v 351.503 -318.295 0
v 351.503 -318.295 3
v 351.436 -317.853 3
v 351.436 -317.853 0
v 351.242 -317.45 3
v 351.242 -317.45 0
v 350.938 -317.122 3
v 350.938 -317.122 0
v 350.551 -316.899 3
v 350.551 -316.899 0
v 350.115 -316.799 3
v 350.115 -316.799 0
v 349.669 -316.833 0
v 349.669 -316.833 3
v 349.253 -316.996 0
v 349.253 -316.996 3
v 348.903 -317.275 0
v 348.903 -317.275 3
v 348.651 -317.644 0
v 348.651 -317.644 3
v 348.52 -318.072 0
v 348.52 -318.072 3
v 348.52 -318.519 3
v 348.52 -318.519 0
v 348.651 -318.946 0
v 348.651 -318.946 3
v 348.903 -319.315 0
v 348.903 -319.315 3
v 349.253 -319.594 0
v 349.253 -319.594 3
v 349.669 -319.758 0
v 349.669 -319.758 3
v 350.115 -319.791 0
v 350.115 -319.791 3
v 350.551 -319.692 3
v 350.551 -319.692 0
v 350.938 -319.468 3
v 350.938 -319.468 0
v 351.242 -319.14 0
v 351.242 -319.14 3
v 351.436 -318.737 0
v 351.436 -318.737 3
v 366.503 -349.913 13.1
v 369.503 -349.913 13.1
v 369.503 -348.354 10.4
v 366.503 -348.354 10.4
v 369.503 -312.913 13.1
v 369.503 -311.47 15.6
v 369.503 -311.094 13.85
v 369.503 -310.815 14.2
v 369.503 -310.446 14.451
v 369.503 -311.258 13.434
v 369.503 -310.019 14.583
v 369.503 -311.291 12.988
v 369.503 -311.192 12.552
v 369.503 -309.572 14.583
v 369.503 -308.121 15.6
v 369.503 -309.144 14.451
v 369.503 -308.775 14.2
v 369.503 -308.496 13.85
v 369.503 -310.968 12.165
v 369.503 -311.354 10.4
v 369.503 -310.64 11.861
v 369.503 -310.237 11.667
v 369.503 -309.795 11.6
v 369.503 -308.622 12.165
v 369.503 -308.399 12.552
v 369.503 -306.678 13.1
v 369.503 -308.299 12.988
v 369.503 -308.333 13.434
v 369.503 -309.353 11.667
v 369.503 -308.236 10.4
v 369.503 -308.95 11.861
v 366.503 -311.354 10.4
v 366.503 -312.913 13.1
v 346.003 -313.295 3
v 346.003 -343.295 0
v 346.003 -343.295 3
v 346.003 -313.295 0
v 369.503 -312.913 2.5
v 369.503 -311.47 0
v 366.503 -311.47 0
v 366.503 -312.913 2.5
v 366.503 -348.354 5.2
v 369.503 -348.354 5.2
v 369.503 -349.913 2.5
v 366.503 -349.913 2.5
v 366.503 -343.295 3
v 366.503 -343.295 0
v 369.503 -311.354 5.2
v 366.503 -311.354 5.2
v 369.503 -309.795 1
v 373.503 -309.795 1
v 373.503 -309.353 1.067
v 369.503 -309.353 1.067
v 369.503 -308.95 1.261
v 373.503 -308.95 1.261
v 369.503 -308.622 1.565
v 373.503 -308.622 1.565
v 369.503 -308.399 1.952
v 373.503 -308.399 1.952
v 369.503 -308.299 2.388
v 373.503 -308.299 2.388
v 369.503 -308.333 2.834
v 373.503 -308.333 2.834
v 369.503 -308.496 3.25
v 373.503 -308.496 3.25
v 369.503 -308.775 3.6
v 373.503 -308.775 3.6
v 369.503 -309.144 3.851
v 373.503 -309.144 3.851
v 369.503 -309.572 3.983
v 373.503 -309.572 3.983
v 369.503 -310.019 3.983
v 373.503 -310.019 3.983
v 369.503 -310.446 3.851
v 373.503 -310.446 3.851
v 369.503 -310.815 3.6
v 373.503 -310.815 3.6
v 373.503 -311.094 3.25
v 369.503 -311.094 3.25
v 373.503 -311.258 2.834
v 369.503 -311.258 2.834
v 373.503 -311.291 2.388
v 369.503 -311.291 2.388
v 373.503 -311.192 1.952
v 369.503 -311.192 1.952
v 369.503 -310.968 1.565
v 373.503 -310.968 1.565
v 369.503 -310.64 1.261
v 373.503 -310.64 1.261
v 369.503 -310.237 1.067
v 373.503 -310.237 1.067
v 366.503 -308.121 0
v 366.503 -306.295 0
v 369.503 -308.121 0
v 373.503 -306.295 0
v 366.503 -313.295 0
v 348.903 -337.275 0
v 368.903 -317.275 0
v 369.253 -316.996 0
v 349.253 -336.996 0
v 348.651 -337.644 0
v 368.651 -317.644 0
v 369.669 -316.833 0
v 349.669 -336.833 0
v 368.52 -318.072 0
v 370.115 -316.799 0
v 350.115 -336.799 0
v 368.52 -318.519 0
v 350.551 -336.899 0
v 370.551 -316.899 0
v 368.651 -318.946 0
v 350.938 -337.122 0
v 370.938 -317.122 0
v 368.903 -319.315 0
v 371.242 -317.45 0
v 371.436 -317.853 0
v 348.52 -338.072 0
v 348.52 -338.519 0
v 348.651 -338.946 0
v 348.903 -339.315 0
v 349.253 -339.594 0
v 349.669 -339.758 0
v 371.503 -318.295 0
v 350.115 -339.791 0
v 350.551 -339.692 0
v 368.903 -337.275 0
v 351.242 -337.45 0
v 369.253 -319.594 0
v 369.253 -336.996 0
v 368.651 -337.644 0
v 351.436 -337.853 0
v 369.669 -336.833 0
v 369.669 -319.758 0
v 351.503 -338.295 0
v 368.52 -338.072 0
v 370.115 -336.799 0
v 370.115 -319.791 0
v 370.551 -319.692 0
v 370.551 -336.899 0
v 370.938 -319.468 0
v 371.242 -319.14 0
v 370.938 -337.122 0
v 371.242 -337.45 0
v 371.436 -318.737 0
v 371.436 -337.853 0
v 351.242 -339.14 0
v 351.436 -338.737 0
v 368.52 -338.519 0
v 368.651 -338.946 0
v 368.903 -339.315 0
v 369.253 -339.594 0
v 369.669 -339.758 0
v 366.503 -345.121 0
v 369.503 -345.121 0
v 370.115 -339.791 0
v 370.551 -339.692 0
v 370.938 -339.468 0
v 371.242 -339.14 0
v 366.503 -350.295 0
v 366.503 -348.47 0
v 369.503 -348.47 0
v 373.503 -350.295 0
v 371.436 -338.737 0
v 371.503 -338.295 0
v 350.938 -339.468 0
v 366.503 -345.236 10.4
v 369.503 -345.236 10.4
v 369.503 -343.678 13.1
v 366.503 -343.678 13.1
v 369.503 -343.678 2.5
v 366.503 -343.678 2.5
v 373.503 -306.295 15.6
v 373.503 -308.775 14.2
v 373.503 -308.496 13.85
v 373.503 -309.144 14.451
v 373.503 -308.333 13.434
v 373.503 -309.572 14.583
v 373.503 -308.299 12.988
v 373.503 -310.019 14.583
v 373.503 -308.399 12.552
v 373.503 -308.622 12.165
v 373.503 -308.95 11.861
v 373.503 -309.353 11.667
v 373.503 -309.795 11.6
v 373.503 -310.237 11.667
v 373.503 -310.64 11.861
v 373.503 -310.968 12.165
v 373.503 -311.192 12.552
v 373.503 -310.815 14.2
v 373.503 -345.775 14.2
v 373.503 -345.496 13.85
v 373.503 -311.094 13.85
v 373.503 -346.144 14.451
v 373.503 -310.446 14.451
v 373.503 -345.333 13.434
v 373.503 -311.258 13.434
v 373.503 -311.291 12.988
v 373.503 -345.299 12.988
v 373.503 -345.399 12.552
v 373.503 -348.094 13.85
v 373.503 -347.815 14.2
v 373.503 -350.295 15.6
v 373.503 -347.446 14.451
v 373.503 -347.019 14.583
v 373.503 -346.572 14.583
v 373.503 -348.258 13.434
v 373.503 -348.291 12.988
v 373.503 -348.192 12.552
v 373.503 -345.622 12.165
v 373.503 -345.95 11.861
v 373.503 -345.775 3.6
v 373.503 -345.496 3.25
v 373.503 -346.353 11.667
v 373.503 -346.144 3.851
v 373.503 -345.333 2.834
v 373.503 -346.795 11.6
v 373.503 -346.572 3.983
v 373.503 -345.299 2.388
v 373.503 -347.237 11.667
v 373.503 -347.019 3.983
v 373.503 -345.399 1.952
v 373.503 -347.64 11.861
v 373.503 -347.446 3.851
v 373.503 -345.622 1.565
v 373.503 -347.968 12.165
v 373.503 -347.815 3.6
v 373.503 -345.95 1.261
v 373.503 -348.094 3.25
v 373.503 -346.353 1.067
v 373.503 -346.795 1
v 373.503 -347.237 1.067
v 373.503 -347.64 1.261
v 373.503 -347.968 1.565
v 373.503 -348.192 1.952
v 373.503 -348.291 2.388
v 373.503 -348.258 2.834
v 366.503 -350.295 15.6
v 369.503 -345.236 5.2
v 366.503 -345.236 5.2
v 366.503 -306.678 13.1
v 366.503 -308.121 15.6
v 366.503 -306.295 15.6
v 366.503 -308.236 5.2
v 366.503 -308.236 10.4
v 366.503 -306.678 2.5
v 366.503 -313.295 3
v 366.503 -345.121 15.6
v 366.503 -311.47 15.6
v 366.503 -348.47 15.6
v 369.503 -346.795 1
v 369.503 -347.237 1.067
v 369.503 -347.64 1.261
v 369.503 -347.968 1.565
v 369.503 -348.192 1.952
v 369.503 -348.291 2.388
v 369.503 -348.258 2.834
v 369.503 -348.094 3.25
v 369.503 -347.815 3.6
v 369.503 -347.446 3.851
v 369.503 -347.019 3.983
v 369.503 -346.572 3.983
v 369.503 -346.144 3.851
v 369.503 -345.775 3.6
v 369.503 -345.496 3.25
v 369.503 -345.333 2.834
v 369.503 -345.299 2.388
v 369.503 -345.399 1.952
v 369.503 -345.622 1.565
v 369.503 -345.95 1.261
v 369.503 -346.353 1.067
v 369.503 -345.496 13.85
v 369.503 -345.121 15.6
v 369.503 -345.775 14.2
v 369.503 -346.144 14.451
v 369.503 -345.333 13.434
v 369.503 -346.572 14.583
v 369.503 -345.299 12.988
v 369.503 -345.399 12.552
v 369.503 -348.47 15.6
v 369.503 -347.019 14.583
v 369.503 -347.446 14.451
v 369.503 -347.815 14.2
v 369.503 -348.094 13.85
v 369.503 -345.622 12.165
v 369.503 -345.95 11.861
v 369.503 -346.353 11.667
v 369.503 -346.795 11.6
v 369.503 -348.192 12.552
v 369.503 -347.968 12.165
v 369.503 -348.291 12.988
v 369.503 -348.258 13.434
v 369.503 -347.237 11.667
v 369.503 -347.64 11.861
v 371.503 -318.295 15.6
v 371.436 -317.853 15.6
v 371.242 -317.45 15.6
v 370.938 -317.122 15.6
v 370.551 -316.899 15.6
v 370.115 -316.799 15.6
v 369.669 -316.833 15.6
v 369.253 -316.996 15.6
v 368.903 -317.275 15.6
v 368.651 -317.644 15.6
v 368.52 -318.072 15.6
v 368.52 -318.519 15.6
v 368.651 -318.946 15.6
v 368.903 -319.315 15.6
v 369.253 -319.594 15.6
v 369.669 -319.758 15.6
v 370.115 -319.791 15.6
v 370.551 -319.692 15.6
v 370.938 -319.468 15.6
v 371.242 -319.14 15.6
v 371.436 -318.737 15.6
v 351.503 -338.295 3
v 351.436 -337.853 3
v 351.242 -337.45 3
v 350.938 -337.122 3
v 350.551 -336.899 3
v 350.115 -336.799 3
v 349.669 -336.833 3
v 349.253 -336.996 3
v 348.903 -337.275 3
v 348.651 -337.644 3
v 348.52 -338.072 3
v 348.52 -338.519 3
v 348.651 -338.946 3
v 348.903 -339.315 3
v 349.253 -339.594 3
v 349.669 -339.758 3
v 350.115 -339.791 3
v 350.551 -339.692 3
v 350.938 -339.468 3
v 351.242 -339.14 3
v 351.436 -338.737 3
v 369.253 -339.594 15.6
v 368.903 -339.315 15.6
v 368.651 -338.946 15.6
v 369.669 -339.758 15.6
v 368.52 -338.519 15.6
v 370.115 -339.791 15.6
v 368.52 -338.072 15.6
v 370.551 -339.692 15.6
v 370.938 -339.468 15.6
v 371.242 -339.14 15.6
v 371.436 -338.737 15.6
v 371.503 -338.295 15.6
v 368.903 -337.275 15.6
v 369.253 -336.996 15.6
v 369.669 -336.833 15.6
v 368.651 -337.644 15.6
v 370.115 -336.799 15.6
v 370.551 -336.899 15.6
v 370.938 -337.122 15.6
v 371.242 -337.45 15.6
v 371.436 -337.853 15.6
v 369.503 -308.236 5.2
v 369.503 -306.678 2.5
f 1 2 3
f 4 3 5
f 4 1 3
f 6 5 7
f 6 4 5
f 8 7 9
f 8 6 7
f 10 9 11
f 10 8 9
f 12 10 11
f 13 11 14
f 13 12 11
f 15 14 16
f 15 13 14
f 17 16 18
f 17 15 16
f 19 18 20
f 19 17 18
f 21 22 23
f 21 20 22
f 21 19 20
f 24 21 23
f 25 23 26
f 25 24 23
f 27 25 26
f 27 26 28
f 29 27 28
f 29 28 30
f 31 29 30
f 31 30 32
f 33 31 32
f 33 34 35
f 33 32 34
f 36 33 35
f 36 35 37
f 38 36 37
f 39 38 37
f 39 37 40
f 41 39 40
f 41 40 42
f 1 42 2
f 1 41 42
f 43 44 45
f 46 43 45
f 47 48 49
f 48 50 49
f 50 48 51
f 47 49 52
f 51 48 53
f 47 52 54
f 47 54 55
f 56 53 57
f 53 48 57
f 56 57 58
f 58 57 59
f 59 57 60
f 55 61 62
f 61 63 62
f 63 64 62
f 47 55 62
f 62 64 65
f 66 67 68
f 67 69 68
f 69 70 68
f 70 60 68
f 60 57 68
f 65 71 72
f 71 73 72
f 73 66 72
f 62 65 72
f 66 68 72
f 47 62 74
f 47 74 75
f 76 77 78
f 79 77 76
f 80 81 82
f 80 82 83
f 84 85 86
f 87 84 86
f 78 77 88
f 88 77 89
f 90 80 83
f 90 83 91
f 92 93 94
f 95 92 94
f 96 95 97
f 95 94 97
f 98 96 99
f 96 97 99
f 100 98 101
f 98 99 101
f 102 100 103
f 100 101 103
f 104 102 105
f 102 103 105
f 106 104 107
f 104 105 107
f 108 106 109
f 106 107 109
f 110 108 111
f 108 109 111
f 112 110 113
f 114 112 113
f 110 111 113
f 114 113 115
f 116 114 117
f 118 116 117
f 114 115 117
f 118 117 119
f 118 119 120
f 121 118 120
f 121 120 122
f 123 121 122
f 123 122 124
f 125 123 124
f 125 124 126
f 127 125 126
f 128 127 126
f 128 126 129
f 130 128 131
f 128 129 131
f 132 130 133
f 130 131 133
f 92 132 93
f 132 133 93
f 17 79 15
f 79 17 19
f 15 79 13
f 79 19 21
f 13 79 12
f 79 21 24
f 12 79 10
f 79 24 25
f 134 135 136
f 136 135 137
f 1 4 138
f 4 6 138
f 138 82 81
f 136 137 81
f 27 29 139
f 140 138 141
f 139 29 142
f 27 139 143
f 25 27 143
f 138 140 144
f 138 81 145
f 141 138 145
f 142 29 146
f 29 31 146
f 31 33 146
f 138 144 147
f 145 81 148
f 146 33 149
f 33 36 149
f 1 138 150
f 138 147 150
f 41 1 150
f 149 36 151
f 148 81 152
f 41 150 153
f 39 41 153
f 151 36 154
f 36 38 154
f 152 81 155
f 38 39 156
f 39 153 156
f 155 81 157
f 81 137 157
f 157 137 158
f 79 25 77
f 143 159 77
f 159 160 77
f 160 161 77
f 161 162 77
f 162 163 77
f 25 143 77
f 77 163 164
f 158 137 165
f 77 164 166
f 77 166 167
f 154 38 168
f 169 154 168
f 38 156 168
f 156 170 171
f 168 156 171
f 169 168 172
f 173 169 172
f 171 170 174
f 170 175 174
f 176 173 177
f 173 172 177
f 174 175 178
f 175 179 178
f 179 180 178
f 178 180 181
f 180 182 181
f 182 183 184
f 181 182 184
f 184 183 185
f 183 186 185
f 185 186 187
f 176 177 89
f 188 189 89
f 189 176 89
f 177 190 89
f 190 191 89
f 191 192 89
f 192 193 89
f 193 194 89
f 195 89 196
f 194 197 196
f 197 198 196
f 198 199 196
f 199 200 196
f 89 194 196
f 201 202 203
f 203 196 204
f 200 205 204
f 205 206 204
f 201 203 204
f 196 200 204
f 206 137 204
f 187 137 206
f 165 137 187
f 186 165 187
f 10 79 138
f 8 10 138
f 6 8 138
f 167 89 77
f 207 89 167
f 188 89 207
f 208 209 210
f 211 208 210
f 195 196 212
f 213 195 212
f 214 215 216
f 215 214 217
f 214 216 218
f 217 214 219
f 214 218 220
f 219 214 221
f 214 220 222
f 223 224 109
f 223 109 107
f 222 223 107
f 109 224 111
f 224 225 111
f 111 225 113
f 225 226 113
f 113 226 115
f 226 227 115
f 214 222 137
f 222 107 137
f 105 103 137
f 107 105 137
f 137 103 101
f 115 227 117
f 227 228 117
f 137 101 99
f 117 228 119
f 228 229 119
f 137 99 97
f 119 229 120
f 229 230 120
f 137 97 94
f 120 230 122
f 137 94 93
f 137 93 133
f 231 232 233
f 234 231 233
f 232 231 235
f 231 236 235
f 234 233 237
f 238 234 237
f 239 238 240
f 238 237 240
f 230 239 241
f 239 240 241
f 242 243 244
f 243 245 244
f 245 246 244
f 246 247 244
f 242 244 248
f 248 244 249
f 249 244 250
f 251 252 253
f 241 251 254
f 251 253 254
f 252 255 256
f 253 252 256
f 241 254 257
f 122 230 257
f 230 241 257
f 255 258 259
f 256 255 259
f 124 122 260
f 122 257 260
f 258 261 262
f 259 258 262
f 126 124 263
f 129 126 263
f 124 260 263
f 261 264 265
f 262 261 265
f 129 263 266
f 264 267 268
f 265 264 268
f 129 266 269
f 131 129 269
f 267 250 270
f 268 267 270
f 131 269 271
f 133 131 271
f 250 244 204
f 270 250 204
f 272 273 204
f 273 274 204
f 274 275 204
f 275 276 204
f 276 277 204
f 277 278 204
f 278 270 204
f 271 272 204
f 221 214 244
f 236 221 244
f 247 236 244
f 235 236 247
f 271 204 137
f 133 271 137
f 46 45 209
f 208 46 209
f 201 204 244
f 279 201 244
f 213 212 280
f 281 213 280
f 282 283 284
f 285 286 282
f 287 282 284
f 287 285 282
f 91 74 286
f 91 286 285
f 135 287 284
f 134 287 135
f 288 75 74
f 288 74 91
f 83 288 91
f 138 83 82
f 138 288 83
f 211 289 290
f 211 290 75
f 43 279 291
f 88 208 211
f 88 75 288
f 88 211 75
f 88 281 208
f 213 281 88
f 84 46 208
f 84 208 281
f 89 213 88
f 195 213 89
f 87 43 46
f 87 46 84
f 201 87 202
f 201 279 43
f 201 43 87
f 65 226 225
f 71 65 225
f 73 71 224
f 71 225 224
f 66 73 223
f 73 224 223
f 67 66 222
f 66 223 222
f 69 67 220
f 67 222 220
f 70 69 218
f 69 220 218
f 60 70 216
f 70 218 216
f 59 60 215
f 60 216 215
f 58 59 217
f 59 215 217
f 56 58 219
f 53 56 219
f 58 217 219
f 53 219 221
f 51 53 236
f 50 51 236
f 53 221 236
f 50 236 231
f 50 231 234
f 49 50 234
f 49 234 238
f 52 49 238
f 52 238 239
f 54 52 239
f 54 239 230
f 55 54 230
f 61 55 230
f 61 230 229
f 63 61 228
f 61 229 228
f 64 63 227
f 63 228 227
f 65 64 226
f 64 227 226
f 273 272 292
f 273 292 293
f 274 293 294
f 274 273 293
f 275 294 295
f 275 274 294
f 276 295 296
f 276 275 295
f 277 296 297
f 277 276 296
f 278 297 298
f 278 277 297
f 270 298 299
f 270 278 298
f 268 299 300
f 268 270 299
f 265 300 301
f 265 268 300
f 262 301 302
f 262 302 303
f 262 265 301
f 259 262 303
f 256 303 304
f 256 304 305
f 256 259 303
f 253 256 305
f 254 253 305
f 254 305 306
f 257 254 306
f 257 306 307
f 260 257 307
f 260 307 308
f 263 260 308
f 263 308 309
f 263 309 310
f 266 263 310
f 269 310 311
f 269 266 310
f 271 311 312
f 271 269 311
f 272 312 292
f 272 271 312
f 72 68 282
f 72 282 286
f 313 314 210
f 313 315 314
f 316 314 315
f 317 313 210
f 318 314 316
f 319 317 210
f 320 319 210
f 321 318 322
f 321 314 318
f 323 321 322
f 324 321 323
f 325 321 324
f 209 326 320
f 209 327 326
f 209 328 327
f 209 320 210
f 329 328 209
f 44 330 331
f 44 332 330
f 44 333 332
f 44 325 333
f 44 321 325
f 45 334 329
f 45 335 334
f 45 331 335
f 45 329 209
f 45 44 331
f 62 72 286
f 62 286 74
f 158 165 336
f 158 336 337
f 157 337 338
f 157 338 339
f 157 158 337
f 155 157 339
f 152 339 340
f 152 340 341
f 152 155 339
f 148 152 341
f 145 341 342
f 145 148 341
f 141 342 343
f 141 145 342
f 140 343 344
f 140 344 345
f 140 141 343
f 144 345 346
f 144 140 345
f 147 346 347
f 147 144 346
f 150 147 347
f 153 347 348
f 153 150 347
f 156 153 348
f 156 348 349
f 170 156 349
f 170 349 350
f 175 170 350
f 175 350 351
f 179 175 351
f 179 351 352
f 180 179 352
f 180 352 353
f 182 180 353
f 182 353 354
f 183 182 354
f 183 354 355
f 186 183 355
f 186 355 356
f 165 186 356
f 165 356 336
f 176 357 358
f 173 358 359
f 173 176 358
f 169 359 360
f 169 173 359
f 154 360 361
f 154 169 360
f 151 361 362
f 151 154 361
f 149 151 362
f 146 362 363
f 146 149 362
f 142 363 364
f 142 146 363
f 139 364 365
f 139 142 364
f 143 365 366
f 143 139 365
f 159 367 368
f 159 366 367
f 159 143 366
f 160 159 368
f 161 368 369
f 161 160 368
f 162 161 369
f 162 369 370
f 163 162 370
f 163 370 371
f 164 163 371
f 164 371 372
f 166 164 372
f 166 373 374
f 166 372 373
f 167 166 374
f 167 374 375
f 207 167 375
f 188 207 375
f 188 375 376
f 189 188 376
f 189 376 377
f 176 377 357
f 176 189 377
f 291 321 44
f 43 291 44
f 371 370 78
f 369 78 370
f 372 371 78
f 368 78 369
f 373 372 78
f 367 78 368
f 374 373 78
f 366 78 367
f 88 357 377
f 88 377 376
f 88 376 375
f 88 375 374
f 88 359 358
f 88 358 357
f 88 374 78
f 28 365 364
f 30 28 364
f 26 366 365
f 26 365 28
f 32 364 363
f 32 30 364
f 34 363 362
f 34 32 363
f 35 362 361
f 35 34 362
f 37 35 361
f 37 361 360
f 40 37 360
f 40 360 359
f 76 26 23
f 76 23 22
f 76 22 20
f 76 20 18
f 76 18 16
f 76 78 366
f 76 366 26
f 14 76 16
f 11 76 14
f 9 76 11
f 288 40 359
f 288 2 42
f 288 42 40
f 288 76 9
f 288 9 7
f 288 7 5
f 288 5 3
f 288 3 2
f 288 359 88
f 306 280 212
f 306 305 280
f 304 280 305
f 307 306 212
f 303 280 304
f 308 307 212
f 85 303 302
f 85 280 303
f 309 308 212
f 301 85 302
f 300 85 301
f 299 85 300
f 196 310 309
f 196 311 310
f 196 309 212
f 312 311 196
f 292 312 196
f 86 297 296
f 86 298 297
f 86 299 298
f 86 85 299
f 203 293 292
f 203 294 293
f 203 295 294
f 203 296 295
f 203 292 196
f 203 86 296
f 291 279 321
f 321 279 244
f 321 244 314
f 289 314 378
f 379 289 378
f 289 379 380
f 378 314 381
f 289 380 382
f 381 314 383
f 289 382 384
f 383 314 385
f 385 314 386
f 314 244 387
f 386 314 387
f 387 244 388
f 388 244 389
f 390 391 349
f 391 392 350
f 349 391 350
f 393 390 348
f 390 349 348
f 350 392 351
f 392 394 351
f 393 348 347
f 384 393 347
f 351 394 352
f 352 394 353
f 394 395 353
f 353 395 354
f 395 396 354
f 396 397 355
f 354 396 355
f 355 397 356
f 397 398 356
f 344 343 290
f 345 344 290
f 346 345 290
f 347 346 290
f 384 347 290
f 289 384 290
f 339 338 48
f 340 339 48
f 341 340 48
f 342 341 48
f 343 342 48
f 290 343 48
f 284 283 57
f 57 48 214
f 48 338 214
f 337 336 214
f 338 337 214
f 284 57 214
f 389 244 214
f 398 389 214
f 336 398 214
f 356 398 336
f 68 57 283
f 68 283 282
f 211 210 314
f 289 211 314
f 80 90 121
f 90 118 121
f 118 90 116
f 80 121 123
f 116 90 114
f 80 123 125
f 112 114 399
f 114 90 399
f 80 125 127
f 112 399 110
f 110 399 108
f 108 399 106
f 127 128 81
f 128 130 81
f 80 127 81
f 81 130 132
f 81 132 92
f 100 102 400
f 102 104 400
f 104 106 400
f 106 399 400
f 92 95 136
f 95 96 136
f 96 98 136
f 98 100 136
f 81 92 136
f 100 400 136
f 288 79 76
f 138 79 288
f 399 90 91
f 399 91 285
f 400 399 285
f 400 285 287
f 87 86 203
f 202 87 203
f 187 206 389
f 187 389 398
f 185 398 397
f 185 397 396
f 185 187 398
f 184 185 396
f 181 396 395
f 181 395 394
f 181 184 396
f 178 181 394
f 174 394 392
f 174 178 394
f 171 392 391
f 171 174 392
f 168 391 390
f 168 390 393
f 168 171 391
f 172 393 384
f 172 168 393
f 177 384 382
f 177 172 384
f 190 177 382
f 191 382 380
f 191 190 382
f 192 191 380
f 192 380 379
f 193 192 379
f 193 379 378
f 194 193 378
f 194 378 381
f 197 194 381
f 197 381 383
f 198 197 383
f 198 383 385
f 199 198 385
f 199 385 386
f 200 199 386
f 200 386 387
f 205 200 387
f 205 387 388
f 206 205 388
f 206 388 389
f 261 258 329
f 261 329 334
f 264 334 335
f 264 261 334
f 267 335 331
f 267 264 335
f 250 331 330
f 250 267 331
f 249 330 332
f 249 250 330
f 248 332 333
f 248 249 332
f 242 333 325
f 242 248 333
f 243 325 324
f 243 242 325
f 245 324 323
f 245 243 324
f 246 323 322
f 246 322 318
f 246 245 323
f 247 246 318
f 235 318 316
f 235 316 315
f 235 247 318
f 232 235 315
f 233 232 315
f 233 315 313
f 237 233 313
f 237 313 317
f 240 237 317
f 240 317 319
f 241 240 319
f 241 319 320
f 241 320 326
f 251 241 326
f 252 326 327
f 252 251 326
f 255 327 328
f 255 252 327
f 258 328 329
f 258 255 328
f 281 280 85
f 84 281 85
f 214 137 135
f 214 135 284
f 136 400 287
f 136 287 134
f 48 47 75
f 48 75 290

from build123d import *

# Parameters (mm, degrees)
SKETCH1_W           = 27.5
SKETCH1_H           = 30
SKETCH1_R           = 1.500000001
SKETCH1_R_2         = 1.5
BOSS_EXTRUDE1_DEPTH = 5
SKETCH1_3_W         = 7
SKETCH1_3_H         = 30
SKETCH1_3_R         = 1.500000001
SKETCH1_3_R_2       = 1.5
BOSS_EXTRUDE2_DEPTH = 15.6
SKETCH4_R           = 1.5
BOSS_EXTRUDE3_DEPTH = 4
BOSS_EXTRUDE4_START = -4
BOSS_EXTRUDE4_DEPTH = 3
SKETCH5_W           = 20.5
SKETCH5_H           = 30
CUT_EXTRUDE1_DEPTH  = 2


with BuildPart() as part:
    # Sketch1 → Boss-Extrude1 (new body)
    with BuildSketch(Plane.XY):
        with Locations((359.752910404, -328.295226576)):
            Rectangle(SKETCH1_W, SKETCH1_H)
        with Locations((370.002910404, -338.295226576)):
            Circle(SKETCH1_R, mode=Mode.SUBTRACT)
        with Locations((370.002910404, -318.295226576)):
            Circle(SKETCH1_R_2, mode=Mode.SUBTRACT)
        with Locations((350.002910404, -318.295226576)):
            Circle(SKETCH1_R_2, mode=Mode.SUBTRACT)
        with Locations((350.002910404, -338.295226576)):
            Circle(SKETCH1_R_2, mode=Mode.SUBTRACT)
    extrude(amount=BOSS_EXTRUDE1_DEPTH)

    # Sketch1<3> → Boss-Extrude2 (add)
    with BuildSketch(Plane.XY):
        with Locations((370.002910404, -328.295226576)):
            Rectangle(SKETCH1_3_W, SKETCH1_3_H)
        with Locations((370.002910404, -338.295226576)):
            Circle(SKETCH1_3_R, mode=Mode.SUBTRACT)
        with Locations((370.002910404, -318.295226576)):
            Circle(SKETCH1_3_R_2, mode=Mode.SUBTRACT)
    extrude(amount=BOSS_EXTRUDE2_DEPTH)

    # Sketch4 → Boss-Extrude3 (add)
    with BuildSketch(Plane(origin=(373.502910404, 0, 0), x_dir=(0, 0, -1), z_dir=(1, 0, 0))):
        Polygon((-15.6, -311.469542357), (-15.6, -313.295226576), (0, -313.295226576), (0, -311.469542357), (-2.5, -312.91291803), (-5.2, -311.354072303), (-5.2, -308.236380849), (-2.5, -306.677535123), (0, -308.120910796), (0, -306.295226576), (-15.6, -306.295226576), (-15.6, -308.120910796), (-13.1, -306.677535123), (-10.4, -308.236380849), (-10.4, -311.354072303), (-13.1, -312.91291803), align=None)
        Polygon((-2.5, -312.91291803), (0, -311.469542357), (0, -308.120910796), (-2.5, -306.677535123), (-5.2, -308.236380849), (-5.2, -311.354072303), align=None)
        with Locations((-2.5, -309.795226576)):
            Circle(SKETCH4_R, mode=Mode.SUBTRACT)
        Polygon((-15.6, -308.120910796), (-15.6, -311.469542357), (-13.1, -312.91291803), (-10.4, -311.354072303), (-10.4, -308.236380849), (-13.1, -306.677535123), align=None)
        with Locations((-13.1, -309.795226576)):
            Circle(SKETCH4_R, mode=Mode.SUBTRACT)
    boss_extrude3 = extrude(amount=-BOSS_EXTRUDE3_DEPTH)

    # Sketch4<3> → Boss-Extrude4 (add)
    with BuildSketch(Plane(origin=(373.502910404, 0, 0), x_dir=(0, 0, -1), z_dir=(1, 0, 0)).offset(BOSS_EXTRUDE4_START)):
        Polygon((-15.6, -311.469542357), (-15.6, -313.295226576), (0, -313.295226576), (0, -311.469542357), (-2.5, -312.91291803), (-5.2, -311.354072303), (-5.2, -308.236380849), (-2.5, -306.677535123), (0, -308.120910796), (0, -306.295226576), (-15.6, -306.295226576), (-15.6, -308.120910796), (-13.1, -306.677535123), (-10.4, -308.236380849), (-10.4, -311.354072303), (-13.1, -312.91291803), align=None)
    boss_extrude4 = extrude(amount=-BOSS_EXTRUDE4_DEPTH)

    # Mirror1: Boss-Extrude3, Boss-Extrude4 across plane
    add(boss_extrude3.mirror(Plane.ZX.offset(-328.295226576)))
    add(boss_extrude4.mirror(Plane.ZX.offset(-328.295226576)))

    # Sketch5 → Cut-Extrude1 (cut)
    with BuildSketch(Plane.XY.offset(5)):
        with Locations((356.252910404, -328.295226576)):
            Rectangle(SKETCH5_W, SKETCH5_H)
    extrude(amount=-CUT_EXTRUDE1_DEPTH, mode=Mode.SUBTRACT)


solid = part.part
